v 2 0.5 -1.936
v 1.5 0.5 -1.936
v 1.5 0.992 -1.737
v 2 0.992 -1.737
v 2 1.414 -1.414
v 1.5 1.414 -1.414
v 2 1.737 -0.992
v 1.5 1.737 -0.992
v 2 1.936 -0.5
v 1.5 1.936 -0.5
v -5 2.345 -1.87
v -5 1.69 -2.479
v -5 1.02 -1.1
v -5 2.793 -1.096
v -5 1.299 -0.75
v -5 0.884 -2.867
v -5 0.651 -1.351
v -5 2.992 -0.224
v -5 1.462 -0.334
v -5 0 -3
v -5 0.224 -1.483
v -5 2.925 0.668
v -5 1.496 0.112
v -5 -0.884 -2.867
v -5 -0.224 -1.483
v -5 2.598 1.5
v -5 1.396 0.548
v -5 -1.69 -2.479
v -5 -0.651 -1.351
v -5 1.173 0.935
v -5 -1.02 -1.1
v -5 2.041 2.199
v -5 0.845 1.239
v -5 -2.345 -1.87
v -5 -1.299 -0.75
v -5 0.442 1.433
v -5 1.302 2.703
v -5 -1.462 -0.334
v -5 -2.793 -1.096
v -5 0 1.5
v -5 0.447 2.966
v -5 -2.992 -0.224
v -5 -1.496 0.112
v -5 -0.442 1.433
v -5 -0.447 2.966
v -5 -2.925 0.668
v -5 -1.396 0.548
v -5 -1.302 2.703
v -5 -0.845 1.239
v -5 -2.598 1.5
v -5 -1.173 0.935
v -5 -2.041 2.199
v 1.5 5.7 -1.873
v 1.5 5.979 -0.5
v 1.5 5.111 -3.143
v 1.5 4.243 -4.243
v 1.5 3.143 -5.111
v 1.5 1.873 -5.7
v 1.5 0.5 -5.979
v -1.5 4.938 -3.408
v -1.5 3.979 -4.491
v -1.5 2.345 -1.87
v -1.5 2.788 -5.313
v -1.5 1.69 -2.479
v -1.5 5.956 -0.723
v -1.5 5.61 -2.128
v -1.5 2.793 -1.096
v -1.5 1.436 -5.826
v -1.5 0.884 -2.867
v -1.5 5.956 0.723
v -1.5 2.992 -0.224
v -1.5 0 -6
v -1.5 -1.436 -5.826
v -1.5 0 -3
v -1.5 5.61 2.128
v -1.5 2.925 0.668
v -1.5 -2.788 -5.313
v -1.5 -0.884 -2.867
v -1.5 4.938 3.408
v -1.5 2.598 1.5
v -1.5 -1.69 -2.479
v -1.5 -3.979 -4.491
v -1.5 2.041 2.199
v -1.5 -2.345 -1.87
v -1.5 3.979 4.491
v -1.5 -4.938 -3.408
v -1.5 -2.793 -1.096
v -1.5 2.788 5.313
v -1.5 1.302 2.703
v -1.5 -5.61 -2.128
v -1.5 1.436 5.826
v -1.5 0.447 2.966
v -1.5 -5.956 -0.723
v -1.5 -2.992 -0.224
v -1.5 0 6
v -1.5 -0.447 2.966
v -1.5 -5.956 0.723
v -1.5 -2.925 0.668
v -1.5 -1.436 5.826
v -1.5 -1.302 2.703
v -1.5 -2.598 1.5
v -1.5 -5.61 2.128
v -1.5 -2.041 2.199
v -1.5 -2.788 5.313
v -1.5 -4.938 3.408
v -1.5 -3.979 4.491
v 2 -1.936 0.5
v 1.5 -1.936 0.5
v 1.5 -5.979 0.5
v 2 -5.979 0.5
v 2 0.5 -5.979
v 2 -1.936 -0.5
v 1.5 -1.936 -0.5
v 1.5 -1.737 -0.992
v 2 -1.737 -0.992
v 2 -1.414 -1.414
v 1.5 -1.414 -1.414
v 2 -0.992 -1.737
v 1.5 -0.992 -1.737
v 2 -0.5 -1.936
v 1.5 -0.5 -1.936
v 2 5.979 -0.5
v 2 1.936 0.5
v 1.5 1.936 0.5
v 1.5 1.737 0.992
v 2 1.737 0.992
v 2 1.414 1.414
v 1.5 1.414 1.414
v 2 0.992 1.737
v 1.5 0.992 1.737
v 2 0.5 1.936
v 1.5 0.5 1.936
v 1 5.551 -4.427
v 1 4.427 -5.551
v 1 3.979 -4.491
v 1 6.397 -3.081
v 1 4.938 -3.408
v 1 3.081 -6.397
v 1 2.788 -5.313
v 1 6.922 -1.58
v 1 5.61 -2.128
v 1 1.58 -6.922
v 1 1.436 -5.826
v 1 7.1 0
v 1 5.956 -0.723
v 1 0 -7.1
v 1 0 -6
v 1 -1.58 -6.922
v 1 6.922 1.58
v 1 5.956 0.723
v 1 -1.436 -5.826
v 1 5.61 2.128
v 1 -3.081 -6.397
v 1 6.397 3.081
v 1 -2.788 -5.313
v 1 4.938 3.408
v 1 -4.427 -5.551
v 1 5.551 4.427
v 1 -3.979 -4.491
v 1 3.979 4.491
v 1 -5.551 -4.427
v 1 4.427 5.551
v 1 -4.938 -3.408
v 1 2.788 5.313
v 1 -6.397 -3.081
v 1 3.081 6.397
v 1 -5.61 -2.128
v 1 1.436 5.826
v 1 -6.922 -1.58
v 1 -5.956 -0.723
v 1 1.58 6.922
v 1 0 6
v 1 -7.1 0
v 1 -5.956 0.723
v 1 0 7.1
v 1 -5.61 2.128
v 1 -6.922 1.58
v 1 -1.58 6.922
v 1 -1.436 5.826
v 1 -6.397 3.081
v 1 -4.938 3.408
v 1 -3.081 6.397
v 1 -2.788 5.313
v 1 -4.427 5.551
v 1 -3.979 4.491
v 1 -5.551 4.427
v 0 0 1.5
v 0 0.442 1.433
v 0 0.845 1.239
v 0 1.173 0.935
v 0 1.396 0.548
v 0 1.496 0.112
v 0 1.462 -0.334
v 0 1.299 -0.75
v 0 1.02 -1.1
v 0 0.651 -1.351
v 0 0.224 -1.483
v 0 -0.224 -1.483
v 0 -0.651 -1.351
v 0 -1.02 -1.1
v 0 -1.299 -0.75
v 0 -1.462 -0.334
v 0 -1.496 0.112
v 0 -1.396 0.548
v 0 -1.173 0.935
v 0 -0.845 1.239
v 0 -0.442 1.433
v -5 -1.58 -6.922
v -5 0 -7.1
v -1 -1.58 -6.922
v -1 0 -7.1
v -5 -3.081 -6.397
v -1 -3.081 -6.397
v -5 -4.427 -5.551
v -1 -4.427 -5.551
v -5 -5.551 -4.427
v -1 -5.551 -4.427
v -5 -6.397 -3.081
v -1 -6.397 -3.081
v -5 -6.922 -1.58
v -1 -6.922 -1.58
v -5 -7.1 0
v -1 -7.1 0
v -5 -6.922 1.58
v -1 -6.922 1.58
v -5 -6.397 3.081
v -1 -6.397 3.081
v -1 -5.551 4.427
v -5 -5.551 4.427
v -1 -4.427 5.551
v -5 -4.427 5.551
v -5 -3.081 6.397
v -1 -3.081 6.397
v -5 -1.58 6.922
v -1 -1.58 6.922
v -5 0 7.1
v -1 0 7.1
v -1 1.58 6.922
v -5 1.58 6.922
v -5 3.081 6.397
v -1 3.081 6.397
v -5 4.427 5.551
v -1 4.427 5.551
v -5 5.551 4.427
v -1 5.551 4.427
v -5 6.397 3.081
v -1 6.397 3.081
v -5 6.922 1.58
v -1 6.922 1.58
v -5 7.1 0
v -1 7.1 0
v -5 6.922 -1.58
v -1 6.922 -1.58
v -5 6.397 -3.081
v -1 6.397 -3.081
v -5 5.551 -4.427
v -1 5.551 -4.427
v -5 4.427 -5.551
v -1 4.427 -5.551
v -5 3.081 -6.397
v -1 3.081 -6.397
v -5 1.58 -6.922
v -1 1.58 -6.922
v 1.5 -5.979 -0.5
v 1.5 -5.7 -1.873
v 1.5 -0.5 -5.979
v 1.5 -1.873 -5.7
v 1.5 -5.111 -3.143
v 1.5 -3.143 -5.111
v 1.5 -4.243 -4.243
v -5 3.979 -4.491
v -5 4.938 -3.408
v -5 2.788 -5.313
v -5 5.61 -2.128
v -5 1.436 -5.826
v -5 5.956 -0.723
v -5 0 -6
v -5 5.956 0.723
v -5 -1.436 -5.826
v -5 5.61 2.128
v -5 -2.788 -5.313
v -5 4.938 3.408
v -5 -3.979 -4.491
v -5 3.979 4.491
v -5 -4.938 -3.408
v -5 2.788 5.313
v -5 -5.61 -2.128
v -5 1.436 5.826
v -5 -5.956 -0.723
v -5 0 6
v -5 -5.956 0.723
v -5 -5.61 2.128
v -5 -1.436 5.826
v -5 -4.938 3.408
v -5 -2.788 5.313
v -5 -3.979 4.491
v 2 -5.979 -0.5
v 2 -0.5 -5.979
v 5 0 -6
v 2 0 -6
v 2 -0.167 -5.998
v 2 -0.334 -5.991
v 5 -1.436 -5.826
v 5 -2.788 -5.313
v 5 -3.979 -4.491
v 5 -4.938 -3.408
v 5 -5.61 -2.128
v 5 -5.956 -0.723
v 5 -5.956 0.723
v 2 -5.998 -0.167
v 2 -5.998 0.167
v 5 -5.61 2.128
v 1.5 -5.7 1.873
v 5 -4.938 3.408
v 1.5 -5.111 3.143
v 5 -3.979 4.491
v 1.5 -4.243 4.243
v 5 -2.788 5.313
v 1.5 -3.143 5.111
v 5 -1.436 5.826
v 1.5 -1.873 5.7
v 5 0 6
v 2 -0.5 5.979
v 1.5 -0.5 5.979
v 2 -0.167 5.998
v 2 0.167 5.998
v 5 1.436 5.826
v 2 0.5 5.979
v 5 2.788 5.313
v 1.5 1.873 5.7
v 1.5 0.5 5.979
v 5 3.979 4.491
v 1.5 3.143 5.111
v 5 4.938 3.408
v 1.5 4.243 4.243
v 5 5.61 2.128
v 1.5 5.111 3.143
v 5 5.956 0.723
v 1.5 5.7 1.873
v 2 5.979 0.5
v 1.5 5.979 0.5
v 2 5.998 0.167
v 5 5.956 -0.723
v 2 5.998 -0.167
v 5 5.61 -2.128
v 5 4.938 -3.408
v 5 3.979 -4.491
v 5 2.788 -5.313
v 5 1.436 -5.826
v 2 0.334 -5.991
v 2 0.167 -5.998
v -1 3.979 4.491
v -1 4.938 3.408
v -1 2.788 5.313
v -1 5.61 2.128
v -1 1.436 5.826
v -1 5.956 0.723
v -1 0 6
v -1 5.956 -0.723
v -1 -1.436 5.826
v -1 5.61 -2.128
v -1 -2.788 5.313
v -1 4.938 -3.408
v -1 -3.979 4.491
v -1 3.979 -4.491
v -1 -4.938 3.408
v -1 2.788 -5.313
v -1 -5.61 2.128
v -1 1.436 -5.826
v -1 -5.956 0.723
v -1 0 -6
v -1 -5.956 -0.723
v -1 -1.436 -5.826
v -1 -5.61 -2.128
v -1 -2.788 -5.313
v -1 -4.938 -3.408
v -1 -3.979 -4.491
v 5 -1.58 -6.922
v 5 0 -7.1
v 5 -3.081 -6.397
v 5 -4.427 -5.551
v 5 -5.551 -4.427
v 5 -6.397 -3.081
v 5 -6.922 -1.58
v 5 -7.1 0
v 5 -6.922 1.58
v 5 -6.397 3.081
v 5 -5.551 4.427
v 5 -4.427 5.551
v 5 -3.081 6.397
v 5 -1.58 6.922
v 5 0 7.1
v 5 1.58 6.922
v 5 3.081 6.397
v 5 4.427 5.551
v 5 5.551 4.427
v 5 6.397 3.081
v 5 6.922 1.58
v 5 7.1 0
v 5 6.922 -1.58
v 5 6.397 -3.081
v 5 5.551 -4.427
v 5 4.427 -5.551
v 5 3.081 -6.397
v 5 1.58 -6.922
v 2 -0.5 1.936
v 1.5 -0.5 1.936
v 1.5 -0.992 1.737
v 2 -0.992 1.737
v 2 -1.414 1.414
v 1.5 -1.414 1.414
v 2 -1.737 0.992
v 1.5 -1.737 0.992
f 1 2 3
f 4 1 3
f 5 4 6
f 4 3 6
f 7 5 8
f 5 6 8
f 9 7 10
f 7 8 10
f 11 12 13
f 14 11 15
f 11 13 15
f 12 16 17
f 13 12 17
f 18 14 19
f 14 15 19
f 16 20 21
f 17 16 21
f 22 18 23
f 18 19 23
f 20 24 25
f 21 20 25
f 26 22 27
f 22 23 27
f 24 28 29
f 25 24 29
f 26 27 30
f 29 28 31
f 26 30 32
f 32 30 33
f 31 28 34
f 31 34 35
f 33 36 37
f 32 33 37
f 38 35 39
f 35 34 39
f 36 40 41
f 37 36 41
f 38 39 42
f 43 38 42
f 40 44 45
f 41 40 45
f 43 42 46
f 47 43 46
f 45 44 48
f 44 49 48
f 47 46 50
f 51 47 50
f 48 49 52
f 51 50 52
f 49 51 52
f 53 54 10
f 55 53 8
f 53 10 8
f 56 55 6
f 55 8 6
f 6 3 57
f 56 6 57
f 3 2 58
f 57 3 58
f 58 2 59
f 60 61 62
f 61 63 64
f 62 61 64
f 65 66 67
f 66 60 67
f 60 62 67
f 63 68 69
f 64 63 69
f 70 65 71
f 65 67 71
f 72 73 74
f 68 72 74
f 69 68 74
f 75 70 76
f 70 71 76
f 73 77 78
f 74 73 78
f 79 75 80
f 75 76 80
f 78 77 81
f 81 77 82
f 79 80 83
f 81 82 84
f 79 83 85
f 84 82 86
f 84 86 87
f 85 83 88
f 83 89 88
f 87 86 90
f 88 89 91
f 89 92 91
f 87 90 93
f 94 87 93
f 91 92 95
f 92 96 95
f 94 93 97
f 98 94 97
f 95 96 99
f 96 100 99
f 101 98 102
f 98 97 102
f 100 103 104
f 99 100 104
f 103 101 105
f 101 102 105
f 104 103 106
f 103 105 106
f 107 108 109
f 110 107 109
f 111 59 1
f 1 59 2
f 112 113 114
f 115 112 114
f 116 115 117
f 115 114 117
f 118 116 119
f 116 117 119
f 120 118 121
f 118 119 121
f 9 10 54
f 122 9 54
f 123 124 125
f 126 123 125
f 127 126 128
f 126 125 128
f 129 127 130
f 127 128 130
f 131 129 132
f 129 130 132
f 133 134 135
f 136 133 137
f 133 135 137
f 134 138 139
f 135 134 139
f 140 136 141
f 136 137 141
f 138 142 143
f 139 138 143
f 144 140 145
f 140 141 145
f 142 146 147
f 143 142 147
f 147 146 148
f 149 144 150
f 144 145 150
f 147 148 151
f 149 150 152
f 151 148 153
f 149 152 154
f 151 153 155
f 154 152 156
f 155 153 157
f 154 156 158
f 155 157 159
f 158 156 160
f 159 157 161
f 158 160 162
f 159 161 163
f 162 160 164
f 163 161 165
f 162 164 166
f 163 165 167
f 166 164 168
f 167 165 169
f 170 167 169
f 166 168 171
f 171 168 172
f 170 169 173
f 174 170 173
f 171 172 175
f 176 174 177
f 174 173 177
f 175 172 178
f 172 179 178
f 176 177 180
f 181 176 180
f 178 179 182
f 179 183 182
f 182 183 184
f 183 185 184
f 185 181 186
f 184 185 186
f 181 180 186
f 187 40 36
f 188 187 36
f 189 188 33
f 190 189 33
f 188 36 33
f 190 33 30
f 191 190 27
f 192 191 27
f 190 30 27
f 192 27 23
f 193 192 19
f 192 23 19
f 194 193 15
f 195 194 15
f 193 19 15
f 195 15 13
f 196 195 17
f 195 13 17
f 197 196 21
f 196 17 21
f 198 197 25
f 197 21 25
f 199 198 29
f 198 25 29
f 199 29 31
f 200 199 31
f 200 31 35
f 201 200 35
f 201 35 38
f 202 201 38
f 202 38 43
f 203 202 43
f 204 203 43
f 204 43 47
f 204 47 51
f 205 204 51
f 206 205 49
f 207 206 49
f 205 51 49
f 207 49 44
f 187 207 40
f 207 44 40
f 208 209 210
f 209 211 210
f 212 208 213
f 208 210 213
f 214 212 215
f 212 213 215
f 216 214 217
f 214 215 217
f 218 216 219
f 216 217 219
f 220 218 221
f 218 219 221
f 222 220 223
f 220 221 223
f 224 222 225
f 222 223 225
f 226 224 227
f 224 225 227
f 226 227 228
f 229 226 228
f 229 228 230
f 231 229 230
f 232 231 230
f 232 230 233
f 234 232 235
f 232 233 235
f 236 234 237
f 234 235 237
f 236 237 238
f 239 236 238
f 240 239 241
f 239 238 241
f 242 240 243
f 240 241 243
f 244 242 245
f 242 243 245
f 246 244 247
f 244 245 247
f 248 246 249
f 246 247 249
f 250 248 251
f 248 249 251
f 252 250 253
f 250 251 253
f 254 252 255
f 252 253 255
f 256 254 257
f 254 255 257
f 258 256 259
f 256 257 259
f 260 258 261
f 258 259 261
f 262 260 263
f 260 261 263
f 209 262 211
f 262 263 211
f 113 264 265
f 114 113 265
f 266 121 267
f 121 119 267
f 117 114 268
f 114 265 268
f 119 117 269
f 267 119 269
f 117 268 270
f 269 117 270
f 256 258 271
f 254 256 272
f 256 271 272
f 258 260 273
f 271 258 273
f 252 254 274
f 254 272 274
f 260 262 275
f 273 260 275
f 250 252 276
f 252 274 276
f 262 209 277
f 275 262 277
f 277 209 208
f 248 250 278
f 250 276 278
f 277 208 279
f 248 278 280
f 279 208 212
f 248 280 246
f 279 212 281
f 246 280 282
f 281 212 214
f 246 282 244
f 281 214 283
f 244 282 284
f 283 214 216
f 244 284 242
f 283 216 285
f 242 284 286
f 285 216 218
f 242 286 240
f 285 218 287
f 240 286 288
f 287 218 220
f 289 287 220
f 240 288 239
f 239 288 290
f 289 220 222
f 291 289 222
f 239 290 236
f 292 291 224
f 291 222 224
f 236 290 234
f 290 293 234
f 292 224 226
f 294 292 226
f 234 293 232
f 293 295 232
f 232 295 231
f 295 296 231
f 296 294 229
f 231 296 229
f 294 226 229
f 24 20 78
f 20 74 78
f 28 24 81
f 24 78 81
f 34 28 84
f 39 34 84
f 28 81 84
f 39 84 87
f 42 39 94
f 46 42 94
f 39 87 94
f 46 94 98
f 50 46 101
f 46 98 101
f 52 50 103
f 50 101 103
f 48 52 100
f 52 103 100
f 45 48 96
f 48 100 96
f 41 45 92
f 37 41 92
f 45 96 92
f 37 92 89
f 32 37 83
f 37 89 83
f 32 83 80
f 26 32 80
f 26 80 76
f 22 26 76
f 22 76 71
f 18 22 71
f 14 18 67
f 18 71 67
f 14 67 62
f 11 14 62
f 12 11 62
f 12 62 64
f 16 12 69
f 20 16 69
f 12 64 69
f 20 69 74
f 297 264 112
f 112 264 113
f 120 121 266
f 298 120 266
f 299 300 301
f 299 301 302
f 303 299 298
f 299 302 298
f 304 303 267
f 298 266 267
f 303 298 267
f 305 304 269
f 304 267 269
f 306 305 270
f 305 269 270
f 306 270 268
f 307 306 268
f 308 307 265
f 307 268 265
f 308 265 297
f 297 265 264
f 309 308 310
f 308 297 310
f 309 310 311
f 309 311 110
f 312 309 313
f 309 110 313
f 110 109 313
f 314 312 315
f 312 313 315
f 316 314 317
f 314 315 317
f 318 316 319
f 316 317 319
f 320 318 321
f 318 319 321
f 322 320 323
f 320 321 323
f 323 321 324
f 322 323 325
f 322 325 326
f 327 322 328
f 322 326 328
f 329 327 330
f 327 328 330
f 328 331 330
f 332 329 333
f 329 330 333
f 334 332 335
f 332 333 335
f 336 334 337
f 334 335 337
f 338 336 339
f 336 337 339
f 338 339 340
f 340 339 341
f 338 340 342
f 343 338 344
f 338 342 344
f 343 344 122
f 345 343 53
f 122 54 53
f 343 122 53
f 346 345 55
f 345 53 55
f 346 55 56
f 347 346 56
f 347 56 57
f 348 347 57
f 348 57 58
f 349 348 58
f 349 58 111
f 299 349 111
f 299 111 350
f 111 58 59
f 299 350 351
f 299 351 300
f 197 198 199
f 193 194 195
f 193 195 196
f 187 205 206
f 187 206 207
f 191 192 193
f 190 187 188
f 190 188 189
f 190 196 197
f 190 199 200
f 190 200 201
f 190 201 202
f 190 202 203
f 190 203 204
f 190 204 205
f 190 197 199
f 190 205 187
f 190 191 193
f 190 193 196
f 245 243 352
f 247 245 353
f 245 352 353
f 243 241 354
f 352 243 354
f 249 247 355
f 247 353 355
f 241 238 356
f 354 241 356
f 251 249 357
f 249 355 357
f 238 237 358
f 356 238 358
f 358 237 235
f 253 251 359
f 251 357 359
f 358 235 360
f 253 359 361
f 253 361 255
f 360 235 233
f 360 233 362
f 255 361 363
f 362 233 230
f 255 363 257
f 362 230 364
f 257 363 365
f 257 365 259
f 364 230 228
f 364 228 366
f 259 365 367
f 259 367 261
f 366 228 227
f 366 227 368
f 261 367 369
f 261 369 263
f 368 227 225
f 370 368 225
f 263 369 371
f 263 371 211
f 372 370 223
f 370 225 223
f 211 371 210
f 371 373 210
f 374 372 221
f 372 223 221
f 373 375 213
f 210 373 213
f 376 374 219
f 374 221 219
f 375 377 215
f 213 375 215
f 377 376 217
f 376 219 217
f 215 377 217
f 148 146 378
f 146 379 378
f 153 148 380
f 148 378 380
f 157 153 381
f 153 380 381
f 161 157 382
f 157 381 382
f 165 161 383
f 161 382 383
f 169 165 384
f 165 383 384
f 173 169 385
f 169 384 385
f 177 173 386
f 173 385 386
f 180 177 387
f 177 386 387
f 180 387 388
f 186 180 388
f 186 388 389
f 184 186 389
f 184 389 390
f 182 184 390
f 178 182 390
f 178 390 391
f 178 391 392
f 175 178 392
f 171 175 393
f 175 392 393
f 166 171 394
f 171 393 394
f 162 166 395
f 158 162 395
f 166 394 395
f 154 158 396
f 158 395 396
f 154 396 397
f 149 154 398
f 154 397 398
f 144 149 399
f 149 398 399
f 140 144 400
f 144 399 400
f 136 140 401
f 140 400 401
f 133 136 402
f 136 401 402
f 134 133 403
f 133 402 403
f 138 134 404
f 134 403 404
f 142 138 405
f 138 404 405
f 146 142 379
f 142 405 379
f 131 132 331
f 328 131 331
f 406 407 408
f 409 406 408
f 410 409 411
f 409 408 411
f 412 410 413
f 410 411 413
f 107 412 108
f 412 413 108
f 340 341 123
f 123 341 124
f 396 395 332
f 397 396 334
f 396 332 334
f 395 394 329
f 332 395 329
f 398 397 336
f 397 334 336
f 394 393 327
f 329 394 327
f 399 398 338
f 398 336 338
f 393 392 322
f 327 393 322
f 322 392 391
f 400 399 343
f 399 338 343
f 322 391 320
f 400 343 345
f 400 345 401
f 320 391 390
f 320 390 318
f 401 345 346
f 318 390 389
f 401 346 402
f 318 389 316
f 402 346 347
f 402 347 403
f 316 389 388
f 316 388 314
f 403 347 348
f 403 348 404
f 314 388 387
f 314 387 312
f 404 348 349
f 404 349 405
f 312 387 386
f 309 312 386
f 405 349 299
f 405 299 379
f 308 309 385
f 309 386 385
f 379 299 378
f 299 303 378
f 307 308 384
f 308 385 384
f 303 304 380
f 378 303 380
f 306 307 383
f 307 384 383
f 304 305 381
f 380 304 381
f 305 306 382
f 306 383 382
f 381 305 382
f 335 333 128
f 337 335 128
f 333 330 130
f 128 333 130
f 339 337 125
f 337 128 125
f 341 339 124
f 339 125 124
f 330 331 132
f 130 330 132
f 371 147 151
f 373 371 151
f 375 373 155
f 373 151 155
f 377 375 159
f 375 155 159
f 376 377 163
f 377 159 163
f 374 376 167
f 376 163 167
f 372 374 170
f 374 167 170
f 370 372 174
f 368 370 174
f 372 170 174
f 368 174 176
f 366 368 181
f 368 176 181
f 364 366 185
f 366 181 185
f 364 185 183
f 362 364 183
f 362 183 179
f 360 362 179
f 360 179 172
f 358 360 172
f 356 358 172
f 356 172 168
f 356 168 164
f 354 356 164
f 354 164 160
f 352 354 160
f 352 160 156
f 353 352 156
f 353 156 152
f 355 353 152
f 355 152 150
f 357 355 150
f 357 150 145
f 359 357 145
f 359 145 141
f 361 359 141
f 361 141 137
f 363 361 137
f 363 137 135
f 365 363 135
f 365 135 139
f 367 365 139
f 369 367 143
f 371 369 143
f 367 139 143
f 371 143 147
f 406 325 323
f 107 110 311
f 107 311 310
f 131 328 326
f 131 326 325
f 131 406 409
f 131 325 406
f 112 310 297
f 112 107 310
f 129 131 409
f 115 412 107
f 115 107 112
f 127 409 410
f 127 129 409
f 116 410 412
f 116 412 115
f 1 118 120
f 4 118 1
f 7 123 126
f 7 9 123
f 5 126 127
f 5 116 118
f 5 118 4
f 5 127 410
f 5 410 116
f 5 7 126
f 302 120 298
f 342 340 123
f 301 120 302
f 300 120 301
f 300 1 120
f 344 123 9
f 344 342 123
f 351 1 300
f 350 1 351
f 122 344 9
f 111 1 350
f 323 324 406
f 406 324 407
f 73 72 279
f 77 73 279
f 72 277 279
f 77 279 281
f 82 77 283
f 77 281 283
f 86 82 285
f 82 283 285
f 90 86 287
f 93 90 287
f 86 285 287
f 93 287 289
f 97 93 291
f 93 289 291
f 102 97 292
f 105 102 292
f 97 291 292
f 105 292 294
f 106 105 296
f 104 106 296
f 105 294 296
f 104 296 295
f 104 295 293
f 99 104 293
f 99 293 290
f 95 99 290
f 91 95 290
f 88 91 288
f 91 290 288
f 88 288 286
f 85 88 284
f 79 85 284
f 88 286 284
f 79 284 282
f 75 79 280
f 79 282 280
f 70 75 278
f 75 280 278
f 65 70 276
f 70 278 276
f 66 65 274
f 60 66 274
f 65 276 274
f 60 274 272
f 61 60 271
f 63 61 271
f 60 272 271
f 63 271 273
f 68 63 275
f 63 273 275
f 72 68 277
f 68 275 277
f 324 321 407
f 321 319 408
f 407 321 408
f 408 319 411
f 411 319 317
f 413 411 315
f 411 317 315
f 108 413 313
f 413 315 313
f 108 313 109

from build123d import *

# Parameters (mm, degrees)
BOSS_EXTRUDE2_DEPTH = 2
SKETCH3_R           = 1.5
CUT_EXTRUDE2_DEPTH  = 5


with BuildPart() as part:
    # Sketch1 → Revolve1 (revolve)
    with BuildSketch(Plane.XY, mode=Mode.PRIVATE) as revolve1_sk:
        Polygon((0, 0), (-5, 0), (-5, 3), (-1.5, 3), (-1.5, 6), (-5, 6), (-5, 7.1), (-1, 7.1), (-1, 6), (1, 6), (1, 7.1), (5, 7.1), (5, 6), (1.5, 6), (1.5, 0), align=None)
    revolve(revolve1_sk.sketch.rotate(Axis((1.5, 0, 0), (-1, 0, 0)), 90), axis=Axis((1.5, 0, 0), (-1, 0, 0)))

    # Sketch2 → Boss-Extrude2 (add)
    with BuildSketch(Plane(origin=(0, 0, 0), x_dir=(0, 0, -1), z_dir=(1, 0, 0))):
        with BuildLine():
            Line((0.5, 1.936491673), (0.5, 5.979130372))
            ThreePointArc((0.5, 5.979130372), (0, 6), (-0.5, 5.979130372))
            Line((-0.5, 5.979130372), (-0.5, 1.936491673))
            ThreePointArc((-0.5, 1.936491673), (-1.414213562, 1.414213562), (-1.936491673, 0.5))
            Line((-1.936491673, 0.5), (-5.979130372, 0.5))
            ThreePointArc((-5.979130372, 0.5), (-6, 0), (-5.979130372, -0.5))
            Line((-5.979130372, -0.5), (-1.936491673, -0.5))
            ThreePointArc((-1.936491673, -0.5), (-1.414213562, -1.414213562), (-0.5, -1.936491673))
            Line((-0.5, -1.936491673), (-0.5, -5.979130372))
            ThreePointArc((-0.5, -5.979130372), (0, -6), (0.5, -5.979130372))
            Line((0.5, -5.979130372), (0.5, -1.936491673))
            ThreePointArc((0.5, -1.936491673), (1.414213562, -1.414213562), (1.936491673, -0.5))
            Line((1.936491673, -0.5), (5.979130372, -0.5))
            ThreePointArc((5.979130372, -0.5), (6, 0), (5.979130372, 0.5))
            Line((5.979130372, 0.5), (1.936491673, 0.5))
            ThreePointArc((1.936491673, 0.5), (1.414213562, 1.414213562), (0.5, 1.936491673))
        make_face()
    extrude(amount=BOSS_EXTRUDE2_DEPTH)

    # Sketch3 → Cut-Extrude2 (cut)
    with BuildSketch(Plane.ZY.offset(5)):
        Circle(SKETCH3_R)
    extrude(amount=-CUT_EXTRUDE2_DEPTH, mode=Mode.SUBTRACT)


solid = part.part
